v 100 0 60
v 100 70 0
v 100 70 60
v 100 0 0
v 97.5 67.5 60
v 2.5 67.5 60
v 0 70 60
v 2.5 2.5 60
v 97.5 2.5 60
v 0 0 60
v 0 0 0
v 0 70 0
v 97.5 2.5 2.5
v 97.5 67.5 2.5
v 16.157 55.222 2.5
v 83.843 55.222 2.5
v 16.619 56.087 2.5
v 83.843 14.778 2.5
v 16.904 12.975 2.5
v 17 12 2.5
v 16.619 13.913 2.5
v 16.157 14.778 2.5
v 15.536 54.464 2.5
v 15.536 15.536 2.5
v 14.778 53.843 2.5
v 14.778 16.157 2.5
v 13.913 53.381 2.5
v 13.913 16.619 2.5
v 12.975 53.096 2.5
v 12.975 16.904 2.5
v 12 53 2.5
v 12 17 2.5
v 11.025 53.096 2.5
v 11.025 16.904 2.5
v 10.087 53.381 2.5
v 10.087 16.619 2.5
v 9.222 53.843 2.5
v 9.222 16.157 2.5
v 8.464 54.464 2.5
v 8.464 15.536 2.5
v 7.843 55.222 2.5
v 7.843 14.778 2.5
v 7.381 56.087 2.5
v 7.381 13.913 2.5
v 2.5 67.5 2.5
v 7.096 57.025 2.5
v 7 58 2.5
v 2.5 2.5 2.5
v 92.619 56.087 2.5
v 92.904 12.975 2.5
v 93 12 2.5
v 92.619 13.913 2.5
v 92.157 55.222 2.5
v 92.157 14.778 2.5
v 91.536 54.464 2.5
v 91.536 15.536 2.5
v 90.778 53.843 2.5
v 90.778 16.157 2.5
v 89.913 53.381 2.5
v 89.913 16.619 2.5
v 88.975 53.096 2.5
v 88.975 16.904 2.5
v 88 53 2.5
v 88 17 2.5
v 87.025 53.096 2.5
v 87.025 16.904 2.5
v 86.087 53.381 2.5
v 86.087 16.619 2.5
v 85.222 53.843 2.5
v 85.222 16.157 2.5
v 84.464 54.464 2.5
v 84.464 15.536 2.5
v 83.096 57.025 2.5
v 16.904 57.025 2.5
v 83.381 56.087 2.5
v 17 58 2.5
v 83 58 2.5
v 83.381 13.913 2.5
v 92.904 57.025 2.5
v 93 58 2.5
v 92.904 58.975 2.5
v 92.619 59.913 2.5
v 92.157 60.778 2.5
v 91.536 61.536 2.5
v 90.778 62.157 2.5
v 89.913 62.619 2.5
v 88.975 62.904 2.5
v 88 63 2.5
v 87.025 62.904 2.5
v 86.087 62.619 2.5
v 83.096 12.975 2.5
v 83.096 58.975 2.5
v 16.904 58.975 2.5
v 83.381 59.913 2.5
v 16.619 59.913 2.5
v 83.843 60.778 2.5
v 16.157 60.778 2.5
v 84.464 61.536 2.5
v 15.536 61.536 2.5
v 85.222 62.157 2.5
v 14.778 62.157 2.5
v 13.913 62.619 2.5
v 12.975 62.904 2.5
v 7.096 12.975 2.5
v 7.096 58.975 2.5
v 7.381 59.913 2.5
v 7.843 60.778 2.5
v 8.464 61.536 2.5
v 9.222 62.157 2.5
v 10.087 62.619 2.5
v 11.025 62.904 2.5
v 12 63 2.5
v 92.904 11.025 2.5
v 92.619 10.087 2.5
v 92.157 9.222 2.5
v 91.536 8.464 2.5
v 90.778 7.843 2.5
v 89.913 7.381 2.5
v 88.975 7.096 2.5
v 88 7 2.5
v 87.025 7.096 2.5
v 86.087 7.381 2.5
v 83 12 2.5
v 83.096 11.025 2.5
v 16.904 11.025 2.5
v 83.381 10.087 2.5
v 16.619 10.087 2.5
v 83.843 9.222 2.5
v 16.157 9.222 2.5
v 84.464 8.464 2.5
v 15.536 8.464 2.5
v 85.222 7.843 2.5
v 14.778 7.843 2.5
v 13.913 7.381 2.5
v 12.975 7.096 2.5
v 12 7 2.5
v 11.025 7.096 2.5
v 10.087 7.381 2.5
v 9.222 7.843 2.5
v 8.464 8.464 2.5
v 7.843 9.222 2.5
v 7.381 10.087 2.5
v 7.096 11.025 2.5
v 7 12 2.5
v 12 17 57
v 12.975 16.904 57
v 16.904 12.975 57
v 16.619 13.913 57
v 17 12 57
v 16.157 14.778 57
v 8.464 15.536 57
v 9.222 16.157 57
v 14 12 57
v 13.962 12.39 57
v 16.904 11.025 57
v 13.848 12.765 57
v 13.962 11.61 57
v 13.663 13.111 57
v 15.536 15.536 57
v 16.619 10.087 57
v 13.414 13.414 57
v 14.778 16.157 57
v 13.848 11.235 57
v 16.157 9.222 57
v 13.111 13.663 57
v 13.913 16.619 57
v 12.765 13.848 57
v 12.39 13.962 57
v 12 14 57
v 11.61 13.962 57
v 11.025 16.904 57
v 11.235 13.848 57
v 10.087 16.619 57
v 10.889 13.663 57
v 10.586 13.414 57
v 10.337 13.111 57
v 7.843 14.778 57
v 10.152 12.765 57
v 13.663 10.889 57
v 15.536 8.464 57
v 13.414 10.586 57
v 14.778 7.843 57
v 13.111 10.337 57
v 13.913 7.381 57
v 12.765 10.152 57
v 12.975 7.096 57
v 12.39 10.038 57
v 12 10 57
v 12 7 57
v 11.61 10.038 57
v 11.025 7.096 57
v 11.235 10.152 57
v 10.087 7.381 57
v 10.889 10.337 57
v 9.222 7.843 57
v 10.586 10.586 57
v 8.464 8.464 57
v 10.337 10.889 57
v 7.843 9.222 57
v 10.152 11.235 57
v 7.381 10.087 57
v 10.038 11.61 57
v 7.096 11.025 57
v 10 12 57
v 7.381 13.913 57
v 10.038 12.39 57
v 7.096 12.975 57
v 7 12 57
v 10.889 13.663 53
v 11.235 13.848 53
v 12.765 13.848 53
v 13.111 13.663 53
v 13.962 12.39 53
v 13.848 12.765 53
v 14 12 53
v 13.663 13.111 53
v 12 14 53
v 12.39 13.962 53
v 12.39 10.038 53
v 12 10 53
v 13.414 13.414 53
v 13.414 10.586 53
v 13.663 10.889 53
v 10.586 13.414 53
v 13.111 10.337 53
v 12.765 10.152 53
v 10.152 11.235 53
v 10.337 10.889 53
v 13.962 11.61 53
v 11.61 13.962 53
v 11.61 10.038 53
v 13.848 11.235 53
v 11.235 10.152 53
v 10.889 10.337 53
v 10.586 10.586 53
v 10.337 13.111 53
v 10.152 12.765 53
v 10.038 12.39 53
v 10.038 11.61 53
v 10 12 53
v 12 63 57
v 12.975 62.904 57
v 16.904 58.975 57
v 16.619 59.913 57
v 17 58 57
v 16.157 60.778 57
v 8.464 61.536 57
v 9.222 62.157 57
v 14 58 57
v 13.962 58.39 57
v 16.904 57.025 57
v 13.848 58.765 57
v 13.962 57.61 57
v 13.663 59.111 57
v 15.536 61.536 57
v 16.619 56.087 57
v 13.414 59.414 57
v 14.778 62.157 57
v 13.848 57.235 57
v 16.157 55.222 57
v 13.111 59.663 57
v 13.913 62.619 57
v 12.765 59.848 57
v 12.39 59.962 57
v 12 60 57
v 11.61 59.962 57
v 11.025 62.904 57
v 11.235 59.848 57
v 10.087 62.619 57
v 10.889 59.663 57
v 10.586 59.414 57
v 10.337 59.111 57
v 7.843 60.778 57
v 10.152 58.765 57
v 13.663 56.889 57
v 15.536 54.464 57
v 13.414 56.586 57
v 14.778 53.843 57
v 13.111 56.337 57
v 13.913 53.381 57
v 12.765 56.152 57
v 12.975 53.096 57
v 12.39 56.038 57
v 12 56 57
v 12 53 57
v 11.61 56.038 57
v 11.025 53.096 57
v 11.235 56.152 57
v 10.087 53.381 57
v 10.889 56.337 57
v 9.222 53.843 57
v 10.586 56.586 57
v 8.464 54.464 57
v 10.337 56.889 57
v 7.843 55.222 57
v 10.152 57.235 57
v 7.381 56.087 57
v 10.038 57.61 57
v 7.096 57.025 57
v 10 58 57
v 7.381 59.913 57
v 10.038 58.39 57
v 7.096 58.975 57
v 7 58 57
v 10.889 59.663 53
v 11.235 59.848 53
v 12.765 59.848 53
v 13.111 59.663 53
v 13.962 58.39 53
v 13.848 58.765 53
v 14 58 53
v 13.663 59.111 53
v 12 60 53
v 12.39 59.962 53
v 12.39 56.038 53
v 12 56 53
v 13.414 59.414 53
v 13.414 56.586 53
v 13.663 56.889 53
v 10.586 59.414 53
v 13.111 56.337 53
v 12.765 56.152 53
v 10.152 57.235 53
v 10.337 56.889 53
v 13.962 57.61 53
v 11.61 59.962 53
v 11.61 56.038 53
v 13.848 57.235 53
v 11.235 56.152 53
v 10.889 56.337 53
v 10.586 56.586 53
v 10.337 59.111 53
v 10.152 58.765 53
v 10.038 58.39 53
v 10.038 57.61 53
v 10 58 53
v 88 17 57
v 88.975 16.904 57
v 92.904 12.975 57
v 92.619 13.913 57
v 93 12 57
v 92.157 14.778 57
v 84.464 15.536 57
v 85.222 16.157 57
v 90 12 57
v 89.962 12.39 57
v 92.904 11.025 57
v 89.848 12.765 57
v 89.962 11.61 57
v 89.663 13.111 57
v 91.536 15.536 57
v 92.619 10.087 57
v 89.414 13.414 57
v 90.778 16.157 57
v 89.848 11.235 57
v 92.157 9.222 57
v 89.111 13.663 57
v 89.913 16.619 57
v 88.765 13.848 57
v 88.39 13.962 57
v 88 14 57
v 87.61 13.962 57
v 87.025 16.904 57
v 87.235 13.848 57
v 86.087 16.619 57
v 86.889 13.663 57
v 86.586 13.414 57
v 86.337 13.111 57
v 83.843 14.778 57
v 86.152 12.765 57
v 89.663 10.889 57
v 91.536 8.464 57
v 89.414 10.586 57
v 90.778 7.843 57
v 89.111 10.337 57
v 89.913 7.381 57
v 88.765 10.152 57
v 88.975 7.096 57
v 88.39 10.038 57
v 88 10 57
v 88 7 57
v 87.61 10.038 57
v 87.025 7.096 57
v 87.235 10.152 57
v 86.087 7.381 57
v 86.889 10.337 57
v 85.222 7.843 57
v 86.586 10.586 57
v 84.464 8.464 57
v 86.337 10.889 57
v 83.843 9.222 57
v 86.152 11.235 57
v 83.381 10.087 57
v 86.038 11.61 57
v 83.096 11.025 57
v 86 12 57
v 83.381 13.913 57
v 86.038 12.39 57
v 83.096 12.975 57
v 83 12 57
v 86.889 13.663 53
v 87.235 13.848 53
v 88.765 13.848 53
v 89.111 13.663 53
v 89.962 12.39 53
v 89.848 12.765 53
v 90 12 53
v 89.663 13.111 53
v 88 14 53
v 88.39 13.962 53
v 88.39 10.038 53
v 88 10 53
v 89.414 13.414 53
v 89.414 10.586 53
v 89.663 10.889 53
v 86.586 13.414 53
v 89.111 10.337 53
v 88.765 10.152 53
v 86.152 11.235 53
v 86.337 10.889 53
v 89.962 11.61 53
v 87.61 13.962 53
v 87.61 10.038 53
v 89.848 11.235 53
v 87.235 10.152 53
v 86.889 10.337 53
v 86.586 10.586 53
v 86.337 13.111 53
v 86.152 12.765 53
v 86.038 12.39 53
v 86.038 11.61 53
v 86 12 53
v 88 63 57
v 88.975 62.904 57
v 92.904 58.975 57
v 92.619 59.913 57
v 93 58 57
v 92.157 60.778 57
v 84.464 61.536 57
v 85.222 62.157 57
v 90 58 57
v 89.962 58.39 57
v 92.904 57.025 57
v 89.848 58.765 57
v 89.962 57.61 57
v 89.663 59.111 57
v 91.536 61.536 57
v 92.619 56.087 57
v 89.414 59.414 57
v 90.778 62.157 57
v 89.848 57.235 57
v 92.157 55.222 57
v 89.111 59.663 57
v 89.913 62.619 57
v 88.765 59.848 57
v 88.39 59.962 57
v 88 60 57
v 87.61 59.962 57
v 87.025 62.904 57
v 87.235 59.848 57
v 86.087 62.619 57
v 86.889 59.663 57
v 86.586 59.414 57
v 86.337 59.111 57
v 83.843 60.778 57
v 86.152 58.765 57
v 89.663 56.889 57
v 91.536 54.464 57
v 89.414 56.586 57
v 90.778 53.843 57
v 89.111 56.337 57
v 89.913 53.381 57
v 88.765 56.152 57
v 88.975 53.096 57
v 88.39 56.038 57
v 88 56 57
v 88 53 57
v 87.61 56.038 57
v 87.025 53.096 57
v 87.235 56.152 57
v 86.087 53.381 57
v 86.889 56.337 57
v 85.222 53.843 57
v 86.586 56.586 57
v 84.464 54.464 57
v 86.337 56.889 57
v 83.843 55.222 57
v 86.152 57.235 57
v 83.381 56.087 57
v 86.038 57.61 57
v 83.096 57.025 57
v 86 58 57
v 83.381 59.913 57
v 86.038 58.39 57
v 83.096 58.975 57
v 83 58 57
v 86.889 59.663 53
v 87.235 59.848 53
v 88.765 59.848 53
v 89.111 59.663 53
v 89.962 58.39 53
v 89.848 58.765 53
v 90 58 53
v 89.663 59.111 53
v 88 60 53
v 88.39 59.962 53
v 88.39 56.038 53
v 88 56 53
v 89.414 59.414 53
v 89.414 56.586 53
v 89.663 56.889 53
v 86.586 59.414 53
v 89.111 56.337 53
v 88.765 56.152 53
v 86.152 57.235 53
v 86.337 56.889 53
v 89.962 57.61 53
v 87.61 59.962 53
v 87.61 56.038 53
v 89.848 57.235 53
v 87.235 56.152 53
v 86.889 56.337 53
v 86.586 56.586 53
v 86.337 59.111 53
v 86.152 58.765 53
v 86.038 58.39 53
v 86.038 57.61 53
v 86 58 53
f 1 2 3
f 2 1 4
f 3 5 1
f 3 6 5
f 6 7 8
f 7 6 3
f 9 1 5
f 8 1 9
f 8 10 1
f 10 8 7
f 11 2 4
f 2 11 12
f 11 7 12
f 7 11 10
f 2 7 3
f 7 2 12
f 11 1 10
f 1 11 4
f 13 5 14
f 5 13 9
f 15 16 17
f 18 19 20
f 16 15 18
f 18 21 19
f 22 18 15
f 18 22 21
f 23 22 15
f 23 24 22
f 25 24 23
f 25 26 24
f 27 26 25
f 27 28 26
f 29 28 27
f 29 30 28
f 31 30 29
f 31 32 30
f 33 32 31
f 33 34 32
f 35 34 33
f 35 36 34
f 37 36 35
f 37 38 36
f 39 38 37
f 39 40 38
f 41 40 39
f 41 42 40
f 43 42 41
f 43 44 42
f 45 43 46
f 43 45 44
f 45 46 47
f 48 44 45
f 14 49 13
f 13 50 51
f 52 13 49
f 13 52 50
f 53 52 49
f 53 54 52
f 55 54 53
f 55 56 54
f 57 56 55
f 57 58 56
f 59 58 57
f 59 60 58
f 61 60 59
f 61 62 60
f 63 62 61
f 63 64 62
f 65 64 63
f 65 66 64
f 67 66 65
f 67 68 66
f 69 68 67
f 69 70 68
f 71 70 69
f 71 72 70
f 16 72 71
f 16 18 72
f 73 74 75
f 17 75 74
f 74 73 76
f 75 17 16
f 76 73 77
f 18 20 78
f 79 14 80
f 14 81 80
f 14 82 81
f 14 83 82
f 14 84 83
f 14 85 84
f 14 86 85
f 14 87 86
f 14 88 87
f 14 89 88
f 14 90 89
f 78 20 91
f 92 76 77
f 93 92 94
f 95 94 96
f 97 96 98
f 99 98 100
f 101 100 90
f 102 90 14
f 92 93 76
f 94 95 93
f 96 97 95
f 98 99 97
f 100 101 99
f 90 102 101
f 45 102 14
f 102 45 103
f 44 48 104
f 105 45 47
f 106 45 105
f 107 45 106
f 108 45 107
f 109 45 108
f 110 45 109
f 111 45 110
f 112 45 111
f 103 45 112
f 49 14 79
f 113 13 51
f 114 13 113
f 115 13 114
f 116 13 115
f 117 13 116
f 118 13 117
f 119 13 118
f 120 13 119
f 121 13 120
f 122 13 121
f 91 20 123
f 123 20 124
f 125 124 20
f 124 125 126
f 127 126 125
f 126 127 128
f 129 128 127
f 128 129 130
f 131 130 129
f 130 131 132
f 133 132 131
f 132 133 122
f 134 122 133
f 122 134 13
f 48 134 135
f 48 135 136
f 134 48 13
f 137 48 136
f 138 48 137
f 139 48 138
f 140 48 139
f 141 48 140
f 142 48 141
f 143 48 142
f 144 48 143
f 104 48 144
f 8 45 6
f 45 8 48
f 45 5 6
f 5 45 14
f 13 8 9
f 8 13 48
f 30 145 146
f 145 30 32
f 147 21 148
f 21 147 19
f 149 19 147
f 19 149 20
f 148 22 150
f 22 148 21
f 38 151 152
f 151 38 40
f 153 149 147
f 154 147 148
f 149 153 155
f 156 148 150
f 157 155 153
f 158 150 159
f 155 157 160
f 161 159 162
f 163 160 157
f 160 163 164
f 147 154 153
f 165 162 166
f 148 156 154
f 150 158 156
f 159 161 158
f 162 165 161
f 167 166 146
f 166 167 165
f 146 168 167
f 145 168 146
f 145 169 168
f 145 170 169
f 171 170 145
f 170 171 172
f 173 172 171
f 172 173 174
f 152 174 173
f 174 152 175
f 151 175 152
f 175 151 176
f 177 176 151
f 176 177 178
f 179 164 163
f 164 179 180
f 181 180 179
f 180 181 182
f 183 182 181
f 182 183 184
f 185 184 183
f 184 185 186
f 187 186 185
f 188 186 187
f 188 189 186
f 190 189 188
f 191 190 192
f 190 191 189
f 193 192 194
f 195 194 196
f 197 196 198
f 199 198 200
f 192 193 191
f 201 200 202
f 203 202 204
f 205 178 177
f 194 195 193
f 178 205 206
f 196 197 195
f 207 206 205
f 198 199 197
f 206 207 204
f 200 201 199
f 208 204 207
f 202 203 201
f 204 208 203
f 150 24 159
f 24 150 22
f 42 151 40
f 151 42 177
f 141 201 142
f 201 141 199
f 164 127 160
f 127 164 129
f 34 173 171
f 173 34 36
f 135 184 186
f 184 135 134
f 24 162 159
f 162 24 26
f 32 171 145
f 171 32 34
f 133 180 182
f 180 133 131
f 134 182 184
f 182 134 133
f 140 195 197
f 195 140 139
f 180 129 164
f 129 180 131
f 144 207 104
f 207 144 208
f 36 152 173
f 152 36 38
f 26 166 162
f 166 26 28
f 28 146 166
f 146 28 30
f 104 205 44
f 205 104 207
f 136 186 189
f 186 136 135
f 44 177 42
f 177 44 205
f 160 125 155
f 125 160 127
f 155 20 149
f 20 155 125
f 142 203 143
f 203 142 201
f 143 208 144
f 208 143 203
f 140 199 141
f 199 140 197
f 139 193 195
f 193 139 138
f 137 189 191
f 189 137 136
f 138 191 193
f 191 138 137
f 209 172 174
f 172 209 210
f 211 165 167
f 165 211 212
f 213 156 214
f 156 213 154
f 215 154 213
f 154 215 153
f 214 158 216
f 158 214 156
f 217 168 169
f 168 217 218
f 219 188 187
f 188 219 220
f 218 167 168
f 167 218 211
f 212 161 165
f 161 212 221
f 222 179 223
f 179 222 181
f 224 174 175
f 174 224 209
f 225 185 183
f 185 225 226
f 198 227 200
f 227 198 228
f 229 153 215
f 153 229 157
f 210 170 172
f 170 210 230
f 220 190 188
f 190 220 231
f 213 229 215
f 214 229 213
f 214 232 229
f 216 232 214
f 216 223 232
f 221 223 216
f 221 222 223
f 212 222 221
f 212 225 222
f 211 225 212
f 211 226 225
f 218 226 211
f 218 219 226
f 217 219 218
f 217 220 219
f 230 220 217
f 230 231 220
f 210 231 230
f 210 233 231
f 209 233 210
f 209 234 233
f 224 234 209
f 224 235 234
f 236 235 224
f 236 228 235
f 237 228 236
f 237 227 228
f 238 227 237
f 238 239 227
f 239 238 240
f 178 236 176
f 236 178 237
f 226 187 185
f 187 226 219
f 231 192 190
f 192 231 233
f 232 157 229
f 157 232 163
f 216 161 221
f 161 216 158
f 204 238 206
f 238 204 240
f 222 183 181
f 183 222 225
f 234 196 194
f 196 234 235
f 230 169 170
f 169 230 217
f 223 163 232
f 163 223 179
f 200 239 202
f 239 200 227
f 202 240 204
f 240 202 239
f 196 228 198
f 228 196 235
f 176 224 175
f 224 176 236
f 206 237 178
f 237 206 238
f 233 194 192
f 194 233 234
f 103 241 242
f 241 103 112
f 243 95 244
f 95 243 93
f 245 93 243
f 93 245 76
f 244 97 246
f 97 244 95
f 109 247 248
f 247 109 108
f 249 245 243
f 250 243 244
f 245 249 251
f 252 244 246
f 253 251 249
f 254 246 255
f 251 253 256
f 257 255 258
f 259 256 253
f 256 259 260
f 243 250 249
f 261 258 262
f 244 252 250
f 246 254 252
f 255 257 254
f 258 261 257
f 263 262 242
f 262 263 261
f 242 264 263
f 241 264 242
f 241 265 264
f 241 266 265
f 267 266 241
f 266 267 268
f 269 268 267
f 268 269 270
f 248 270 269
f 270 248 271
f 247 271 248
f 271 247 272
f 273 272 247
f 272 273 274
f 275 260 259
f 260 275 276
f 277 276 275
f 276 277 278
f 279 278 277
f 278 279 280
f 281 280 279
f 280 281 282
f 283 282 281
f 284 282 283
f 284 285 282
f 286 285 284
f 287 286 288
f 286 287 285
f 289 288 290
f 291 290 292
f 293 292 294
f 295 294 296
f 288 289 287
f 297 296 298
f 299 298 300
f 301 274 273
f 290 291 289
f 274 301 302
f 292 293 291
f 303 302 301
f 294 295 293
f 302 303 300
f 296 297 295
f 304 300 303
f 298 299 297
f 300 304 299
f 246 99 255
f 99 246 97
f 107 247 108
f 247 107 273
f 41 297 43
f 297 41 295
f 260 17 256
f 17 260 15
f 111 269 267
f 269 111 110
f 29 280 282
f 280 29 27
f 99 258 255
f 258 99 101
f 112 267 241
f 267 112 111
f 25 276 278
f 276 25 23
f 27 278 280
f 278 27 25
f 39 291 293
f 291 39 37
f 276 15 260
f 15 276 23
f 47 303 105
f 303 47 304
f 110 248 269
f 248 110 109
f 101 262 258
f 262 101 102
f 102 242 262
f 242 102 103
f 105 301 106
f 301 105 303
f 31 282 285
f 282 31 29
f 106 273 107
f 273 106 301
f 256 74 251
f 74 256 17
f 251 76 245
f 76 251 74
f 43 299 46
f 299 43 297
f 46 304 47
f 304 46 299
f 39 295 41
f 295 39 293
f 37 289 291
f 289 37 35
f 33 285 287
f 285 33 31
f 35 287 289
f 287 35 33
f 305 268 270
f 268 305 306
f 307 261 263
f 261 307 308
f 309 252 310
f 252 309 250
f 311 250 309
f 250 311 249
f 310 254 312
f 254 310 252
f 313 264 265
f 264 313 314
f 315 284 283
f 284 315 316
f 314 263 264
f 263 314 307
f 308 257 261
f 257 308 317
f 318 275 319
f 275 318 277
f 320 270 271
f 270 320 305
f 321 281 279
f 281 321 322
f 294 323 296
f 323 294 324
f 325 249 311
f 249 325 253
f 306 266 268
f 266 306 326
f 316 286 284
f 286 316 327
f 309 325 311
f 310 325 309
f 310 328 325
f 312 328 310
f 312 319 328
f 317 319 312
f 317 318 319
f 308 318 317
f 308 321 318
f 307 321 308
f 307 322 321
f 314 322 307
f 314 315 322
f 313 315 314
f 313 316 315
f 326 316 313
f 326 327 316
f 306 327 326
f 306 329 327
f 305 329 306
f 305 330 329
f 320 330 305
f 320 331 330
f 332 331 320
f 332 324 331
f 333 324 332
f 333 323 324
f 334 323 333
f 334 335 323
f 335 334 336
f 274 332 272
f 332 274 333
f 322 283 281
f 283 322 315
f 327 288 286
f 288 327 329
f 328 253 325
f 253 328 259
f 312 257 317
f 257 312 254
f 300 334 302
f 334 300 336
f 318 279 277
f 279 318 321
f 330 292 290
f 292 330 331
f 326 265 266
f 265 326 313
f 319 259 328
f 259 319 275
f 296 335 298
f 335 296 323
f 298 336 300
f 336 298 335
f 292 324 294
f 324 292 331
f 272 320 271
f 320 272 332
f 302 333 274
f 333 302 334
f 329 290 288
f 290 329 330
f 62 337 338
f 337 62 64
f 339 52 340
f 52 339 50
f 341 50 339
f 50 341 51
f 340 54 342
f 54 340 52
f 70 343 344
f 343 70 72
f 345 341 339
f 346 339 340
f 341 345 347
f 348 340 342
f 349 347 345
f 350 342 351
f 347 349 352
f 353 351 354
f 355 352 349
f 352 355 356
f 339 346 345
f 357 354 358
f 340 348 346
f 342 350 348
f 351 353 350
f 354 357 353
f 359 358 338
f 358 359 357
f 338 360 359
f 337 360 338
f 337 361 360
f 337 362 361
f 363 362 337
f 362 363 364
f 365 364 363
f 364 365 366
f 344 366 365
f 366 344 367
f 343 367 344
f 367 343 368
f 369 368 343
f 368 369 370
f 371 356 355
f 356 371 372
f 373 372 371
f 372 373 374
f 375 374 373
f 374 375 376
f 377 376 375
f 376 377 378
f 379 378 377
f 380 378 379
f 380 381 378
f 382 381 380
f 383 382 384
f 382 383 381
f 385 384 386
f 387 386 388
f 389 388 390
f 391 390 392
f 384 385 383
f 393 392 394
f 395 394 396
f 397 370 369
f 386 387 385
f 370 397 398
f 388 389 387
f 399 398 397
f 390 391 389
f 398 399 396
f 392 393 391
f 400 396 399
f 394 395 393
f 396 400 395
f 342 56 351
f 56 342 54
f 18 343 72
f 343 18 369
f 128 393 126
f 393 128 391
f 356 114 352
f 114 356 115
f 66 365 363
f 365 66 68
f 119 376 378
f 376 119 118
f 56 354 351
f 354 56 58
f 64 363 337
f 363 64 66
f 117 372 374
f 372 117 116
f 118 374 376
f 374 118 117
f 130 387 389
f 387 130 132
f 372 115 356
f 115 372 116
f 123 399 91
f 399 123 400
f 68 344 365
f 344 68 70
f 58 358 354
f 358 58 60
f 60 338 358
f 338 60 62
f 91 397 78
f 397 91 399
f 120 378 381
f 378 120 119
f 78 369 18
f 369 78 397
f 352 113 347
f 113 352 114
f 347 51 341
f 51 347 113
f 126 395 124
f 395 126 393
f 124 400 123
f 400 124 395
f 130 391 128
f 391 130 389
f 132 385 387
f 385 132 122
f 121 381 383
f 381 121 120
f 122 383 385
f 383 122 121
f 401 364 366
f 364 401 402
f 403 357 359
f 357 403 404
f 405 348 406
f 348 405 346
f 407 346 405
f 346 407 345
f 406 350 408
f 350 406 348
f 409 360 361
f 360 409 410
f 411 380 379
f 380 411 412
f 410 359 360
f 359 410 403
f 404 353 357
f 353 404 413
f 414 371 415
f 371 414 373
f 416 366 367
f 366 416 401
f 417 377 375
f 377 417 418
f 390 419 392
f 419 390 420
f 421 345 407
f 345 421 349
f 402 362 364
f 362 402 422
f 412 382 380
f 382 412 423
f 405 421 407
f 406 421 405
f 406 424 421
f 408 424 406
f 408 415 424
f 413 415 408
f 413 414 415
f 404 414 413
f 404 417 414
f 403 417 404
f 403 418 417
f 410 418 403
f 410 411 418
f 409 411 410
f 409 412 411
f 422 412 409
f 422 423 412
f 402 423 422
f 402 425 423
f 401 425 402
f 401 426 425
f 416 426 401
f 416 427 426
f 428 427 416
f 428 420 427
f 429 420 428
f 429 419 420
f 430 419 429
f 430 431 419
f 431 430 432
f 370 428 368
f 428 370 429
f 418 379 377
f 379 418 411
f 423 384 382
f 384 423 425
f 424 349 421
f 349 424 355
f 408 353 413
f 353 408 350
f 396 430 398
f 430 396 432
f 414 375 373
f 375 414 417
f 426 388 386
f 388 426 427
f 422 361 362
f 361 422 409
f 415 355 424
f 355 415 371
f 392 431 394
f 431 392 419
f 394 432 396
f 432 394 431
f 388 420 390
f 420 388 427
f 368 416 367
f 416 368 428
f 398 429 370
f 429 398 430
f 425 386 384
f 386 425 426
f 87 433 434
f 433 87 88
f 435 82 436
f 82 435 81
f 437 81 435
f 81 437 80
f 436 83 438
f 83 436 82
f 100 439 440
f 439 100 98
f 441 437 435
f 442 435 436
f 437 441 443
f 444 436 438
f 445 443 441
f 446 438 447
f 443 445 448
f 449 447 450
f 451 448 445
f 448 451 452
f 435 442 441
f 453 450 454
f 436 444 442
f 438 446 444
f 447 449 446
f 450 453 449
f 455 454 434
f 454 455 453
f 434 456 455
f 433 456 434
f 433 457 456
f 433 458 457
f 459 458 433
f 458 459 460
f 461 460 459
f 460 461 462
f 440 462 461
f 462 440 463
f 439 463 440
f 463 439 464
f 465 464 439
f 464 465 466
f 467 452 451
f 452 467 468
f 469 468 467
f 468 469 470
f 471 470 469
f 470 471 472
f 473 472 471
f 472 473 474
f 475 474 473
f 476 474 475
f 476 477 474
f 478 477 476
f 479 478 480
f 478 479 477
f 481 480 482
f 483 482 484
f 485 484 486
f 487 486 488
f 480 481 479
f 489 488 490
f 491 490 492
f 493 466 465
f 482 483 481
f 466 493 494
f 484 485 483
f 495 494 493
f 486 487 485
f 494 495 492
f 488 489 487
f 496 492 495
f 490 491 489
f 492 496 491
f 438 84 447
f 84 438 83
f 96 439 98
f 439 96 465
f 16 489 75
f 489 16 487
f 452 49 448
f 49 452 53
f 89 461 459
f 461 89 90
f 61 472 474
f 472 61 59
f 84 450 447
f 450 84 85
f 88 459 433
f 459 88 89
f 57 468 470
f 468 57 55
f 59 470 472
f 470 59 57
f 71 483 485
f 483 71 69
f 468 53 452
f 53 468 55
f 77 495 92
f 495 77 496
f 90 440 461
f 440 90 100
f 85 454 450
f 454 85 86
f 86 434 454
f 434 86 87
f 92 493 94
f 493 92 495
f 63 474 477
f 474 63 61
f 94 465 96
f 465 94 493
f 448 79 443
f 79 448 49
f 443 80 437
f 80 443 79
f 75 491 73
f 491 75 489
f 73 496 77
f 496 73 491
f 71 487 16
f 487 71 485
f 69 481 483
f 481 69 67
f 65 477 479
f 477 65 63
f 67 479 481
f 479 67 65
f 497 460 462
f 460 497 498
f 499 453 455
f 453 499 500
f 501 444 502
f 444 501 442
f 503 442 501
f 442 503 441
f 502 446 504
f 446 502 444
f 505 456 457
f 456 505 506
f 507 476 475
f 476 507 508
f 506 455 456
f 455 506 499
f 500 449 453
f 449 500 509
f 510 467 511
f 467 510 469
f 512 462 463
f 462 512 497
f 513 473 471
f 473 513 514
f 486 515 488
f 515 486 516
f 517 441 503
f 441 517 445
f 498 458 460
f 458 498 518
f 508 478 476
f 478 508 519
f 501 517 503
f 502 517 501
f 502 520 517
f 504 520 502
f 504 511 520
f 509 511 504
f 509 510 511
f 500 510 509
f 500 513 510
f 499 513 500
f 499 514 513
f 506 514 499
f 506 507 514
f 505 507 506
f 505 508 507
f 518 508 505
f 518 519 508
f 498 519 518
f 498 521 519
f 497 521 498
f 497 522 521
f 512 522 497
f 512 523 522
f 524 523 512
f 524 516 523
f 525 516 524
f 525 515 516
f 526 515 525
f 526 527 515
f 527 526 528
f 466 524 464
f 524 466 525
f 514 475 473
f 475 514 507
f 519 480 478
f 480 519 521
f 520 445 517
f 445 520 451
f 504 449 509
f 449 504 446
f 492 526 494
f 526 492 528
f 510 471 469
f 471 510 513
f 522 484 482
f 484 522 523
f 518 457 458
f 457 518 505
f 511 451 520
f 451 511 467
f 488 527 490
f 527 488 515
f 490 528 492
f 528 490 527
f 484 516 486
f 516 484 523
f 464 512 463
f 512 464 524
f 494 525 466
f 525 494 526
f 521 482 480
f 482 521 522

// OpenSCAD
$fn = 32;

// ----------------------------------------------------------------------
// Enclosure box: bosses enclosure
// ----------------------------------------------------------------------

// --- parameters (mm) ---
box_l = 100;              // outer length, X
box_w = 70;               // outer width, Y
box_h = 60;               // outer height
wall_t = 2.5;             // wall thickness
boss_r = 5;               // corner boss radius
hole_r = 2;               // boss screw hole radius
boss_in = 12;             // boss inset from the corners

inner_h = box_h - wall_t;  // cavity depth
boss_h = inner_h - 2;  // corner boss height

difference() {
  union() {
    difference() {
      cube([box_l, box_w, box_h]);
      translate([wall_t, wall_t, wall_t])
        cube([box_l - 2 * wall_t, box_w - 2 * wall_t, box_h]);
    }
    for (sx = [0, 1], sy = [0, 1])
      translate([sx ? box_l - boss_in : boss_in,
                 sy ? box_w - boss_in : boss_in, wall_t - 1])
        difference() {
          cylinder(r = boss_r, h = boss_h);
          translate([0, 0, boss_h - 4])
            cylinder(r = hole_r, h = 5);
        }
  }
}
